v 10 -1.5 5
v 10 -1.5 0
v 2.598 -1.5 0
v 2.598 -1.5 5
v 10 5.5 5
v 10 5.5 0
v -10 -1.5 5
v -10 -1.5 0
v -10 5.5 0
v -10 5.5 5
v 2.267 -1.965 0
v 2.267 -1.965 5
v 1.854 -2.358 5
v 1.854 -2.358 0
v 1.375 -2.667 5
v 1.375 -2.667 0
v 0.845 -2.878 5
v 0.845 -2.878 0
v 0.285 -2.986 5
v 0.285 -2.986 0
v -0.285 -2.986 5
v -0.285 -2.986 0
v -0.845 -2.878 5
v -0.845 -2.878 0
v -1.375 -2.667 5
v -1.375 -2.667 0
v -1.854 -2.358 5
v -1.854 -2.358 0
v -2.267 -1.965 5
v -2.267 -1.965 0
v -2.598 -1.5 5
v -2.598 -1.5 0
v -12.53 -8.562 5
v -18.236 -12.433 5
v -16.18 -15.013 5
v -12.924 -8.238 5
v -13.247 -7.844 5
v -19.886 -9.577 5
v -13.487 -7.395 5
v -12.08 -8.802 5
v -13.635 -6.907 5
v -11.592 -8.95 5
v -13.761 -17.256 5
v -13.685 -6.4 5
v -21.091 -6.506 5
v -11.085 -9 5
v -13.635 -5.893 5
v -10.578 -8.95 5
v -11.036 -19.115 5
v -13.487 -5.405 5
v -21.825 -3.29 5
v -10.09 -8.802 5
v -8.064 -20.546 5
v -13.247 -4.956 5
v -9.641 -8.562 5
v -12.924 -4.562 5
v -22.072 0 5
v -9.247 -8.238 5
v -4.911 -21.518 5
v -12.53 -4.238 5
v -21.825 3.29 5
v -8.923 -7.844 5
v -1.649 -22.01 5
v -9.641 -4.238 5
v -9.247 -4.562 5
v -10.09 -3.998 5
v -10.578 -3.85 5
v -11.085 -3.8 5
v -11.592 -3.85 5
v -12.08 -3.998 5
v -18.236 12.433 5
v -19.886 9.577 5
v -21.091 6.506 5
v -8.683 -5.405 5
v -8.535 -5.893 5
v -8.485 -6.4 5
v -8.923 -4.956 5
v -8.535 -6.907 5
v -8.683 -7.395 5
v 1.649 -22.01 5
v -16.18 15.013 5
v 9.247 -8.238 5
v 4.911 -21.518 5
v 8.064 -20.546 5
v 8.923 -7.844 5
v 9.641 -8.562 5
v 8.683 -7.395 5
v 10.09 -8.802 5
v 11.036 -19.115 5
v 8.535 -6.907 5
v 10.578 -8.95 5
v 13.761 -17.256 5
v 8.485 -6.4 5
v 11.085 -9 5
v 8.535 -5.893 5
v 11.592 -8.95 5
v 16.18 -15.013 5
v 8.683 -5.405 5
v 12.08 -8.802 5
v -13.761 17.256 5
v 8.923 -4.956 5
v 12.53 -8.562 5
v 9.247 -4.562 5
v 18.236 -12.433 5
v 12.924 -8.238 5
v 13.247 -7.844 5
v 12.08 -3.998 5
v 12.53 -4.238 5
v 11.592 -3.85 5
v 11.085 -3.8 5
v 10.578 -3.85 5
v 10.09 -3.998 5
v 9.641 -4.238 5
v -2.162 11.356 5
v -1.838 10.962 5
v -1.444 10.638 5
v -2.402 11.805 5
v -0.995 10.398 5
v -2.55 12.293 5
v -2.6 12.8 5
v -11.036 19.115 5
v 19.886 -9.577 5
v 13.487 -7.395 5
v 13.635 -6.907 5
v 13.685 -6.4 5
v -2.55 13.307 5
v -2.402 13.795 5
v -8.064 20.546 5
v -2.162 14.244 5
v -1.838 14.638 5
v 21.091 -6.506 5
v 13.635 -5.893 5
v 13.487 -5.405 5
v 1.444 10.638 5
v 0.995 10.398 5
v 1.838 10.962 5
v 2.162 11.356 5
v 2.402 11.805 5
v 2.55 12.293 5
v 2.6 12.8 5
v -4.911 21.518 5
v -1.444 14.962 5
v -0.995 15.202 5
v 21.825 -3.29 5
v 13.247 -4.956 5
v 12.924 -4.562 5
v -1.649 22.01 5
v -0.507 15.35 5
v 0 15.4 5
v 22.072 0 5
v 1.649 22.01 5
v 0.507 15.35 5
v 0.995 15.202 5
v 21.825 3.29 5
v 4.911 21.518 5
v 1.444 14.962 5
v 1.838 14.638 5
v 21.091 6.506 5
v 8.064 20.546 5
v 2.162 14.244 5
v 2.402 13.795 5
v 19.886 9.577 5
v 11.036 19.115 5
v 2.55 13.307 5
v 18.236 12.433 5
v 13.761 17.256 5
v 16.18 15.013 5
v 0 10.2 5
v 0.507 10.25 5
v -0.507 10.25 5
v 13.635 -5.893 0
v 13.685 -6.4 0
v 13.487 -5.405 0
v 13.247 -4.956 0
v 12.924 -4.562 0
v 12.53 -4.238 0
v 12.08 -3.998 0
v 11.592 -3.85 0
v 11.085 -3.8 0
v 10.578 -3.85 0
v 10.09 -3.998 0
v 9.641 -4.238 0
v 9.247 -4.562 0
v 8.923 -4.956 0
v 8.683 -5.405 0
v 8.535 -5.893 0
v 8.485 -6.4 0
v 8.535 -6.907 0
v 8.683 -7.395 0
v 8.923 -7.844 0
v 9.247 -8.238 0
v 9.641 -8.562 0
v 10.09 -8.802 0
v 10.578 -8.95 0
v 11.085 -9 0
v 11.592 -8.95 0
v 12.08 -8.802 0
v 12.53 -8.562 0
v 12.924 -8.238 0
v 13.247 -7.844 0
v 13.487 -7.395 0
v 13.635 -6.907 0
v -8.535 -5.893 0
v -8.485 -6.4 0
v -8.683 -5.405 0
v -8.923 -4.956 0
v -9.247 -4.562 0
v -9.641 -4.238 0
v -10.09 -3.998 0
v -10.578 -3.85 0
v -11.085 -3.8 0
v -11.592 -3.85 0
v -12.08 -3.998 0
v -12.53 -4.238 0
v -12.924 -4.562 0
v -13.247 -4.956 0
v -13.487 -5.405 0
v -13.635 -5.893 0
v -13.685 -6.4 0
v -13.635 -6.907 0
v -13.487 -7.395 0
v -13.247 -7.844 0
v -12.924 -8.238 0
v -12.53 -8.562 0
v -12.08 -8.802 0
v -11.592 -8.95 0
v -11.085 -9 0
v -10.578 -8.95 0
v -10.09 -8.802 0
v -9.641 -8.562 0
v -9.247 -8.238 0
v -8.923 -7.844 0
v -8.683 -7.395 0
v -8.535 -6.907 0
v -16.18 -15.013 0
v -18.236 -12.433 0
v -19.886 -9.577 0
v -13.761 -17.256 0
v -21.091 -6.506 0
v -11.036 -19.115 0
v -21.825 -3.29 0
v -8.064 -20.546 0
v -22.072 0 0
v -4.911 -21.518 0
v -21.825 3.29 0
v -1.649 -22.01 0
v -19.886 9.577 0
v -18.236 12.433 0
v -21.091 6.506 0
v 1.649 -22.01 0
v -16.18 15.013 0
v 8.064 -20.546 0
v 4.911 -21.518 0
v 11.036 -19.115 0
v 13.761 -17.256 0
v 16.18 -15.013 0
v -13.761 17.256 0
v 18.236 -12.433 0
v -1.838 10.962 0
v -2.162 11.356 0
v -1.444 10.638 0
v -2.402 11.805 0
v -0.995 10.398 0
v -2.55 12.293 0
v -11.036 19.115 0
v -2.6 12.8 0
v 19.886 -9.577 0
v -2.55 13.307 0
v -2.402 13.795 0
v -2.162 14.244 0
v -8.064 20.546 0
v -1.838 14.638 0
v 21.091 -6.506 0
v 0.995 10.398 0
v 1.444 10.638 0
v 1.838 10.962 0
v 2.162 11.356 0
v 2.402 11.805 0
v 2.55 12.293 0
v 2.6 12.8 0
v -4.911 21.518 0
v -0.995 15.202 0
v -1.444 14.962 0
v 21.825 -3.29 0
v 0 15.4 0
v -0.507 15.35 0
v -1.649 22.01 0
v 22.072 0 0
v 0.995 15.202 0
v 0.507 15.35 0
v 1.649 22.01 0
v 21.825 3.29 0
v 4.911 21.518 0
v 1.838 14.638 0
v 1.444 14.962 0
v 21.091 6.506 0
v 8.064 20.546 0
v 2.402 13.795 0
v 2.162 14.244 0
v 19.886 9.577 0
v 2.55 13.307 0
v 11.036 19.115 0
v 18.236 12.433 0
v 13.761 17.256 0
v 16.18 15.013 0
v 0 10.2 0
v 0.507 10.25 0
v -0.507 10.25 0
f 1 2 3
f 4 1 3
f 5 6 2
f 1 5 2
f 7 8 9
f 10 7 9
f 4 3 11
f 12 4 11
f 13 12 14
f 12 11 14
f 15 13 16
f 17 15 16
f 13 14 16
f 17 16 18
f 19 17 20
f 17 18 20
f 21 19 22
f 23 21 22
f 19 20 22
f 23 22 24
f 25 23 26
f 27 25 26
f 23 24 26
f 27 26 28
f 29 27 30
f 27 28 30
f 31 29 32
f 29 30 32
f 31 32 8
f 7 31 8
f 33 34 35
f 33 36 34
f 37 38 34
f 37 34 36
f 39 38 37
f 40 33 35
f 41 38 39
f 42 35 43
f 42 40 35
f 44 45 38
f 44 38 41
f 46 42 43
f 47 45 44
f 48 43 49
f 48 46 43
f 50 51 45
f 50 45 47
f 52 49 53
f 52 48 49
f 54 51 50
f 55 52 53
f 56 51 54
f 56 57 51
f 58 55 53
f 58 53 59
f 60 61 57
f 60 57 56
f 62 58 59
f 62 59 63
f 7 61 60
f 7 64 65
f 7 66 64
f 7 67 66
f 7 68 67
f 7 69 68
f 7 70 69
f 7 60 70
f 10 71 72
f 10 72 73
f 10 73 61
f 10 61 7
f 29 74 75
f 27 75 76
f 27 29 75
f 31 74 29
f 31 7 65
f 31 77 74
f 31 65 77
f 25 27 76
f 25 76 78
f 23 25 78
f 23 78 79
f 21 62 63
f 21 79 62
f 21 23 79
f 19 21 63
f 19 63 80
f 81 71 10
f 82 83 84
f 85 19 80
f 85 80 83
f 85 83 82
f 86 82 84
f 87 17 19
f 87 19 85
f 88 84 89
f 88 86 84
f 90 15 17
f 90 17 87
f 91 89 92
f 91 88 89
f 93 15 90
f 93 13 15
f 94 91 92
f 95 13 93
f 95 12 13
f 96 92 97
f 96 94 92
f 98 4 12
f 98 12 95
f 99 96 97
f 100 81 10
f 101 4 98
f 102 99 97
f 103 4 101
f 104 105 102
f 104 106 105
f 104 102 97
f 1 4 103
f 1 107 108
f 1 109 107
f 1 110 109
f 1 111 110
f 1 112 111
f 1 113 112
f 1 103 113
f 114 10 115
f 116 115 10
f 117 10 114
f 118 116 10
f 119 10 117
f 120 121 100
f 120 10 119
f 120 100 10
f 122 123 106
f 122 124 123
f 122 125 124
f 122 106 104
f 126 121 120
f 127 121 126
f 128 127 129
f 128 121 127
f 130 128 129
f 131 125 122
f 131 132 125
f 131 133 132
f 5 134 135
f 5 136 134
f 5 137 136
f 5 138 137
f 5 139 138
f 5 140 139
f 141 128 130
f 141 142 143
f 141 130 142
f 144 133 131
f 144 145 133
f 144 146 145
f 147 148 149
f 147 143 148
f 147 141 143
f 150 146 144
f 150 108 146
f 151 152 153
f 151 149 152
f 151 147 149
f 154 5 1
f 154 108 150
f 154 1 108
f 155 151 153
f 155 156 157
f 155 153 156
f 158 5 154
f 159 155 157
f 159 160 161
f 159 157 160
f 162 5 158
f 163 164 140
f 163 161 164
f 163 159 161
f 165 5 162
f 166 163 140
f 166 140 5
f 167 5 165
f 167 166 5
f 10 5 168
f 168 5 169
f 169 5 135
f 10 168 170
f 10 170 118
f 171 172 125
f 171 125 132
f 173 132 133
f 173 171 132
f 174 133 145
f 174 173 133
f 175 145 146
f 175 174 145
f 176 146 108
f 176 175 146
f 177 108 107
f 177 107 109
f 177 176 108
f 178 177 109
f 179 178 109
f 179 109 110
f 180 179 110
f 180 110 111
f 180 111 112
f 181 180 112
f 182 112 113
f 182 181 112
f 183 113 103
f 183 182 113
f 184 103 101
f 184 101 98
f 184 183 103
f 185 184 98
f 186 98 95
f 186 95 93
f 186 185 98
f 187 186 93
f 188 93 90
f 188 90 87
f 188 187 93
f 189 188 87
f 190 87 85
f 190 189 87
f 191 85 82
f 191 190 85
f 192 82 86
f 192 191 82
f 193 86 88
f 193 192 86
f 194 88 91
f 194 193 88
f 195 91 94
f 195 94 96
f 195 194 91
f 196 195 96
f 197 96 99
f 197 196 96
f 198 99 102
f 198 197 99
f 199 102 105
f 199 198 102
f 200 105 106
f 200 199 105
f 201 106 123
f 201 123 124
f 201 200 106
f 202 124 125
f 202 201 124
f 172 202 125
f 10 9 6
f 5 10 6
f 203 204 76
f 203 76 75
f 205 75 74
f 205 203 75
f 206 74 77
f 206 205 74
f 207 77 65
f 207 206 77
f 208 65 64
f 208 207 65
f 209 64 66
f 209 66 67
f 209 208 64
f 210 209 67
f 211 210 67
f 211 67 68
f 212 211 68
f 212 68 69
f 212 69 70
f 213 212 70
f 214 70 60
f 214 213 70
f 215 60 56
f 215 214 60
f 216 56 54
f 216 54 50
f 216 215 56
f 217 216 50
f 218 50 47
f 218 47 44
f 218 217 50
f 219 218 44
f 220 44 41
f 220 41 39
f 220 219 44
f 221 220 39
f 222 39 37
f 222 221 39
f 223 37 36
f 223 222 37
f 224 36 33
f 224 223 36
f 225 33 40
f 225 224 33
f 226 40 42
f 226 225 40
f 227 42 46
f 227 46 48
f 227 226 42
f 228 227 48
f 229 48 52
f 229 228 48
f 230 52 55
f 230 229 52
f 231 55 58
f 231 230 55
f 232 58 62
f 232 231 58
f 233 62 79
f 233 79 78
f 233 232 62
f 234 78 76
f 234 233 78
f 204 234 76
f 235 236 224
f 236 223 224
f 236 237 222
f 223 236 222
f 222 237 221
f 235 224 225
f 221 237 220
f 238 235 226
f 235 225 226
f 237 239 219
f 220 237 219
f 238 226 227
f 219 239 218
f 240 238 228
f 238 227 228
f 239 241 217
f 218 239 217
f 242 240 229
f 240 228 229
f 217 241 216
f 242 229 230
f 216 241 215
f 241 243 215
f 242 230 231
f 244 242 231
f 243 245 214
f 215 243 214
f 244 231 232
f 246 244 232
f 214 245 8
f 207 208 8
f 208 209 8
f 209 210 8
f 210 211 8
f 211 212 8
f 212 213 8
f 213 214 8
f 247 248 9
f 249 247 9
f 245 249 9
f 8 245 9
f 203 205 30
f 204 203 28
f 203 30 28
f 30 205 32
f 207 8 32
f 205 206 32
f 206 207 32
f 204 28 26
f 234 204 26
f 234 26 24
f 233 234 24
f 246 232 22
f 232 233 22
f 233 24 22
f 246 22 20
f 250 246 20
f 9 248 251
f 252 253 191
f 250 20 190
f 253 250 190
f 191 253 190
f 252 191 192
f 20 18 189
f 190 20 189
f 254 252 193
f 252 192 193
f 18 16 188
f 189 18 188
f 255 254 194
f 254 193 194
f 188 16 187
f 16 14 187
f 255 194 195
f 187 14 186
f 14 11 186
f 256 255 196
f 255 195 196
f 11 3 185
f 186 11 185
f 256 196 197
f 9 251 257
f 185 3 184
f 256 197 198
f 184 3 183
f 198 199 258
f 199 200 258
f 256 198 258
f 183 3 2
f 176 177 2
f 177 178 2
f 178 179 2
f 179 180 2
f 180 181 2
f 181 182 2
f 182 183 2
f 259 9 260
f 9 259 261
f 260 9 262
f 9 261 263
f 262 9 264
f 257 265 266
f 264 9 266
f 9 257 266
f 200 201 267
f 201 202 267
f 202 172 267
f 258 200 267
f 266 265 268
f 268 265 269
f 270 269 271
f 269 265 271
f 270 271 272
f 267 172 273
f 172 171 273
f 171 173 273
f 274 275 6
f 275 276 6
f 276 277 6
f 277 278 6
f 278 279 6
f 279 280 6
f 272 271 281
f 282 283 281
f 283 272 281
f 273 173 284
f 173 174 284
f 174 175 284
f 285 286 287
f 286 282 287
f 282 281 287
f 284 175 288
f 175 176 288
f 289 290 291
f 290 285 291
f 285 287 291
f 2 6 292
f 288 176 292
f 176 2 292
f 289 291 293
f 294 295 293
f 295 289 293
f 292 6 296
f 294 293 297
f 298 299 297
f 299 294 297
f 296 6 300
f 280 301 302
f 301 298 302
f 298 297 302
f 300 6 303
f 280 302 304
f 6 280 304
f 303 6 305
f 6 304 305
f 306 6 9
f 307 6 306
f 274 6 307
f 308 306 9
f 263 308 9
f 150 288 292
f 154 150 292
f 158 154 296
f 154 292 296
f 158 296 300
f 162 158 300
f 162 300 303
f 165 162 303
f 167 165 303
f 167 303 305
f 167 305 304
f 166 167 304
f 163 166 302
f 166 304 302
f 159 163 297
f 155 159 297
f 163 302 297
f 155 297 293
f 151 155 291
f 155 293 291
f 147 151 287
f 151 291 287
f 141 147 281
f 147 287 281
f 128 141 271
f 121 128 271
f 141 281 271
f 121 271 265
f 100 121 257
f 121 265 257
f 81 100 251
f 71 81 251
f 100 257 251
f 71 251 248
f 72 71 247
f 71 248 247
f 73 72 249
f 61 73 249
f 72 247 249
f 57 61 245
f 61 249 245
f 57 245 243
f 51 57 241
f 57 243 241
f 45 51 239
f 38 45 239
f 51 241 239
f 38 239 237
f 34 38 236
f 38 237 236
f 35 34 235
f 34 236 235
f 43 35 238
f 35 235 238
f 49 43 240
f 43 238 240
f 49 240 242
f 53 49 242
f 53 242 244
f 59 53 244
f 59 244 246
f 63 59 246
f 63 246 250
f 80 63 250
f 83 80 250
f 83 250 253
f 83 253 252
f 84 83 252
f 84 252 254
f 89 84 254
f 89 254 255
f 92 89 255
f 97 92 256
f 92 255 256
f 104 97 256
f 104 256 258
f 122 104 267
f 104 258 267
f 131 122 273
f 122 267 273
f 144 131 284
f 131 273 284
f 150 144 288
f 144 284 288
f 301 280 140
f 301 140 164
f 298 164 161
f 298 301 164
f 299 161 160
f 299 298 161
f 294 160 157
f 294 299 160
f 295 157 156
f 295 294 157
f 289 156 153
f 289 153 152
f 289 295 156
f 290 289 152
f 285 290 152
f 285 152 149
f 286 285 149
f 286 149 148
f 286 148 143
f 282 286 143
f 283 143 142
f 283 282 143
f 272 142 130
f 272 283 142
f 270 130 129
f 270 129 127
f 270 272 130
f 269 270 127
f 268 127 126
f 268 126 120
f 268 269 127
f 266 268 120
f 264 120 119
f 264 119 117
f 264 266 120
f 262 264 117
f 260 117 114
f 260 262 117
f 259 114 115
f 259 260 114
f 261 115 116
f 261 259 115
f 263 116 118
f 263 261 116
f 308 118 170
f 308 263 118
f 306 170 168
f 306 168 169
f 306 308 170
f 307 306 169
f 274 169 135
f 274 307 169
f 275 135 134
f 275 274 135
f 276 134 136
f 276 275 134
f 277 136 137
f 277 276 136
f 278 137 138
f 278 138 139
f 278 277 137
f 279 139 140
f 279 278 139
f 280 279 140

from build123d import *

# Parameters (mm, degrees)
SKETCH_1_R      = 22.071639064
SKETCH_1_R_2    = 2.6
EXTRUDE_1_DEPTH = 5


with BuildPart() as part:
    # 스케치1 → 보스-돌출1 (new body)
    with BuildSketch(Plane.XY):
        Circle(SKETCH_1_R)
        with Locations((0, 12.8)):
            Circle(SKETCH_1_R_2, mode=Mode.SUBTRACT)
        with Locations((-11.085125168, -6.4)):
            Circle(SKETCH_1_R_2, mode=Mode.SUBTRACT)
        with Locations((11.085125168, -6.4)):
            Circle(SKETCH_1_R_2, mode=Mode.SUBTRACT)
        with BuildLine():
            Line((-10, 5.5), (10, 5.5))
            Line((10, 5.5), (10, -1.5))
            Line((10, -1.5), (2.598076211, -1.5))
            ThreePointArc((2.598076211, -1.5), (0, -3), (-2.598076211, -1.5))
            Line((-2.598076211, -1.5), (-10, -1.5))
            Line((-10, -1.5), (-10, 5.5))
        make_face(mode=Mode.SUBTRACT)
    extrude(amount=EXTRUDE_1_DEPTH)


solid = part.part
